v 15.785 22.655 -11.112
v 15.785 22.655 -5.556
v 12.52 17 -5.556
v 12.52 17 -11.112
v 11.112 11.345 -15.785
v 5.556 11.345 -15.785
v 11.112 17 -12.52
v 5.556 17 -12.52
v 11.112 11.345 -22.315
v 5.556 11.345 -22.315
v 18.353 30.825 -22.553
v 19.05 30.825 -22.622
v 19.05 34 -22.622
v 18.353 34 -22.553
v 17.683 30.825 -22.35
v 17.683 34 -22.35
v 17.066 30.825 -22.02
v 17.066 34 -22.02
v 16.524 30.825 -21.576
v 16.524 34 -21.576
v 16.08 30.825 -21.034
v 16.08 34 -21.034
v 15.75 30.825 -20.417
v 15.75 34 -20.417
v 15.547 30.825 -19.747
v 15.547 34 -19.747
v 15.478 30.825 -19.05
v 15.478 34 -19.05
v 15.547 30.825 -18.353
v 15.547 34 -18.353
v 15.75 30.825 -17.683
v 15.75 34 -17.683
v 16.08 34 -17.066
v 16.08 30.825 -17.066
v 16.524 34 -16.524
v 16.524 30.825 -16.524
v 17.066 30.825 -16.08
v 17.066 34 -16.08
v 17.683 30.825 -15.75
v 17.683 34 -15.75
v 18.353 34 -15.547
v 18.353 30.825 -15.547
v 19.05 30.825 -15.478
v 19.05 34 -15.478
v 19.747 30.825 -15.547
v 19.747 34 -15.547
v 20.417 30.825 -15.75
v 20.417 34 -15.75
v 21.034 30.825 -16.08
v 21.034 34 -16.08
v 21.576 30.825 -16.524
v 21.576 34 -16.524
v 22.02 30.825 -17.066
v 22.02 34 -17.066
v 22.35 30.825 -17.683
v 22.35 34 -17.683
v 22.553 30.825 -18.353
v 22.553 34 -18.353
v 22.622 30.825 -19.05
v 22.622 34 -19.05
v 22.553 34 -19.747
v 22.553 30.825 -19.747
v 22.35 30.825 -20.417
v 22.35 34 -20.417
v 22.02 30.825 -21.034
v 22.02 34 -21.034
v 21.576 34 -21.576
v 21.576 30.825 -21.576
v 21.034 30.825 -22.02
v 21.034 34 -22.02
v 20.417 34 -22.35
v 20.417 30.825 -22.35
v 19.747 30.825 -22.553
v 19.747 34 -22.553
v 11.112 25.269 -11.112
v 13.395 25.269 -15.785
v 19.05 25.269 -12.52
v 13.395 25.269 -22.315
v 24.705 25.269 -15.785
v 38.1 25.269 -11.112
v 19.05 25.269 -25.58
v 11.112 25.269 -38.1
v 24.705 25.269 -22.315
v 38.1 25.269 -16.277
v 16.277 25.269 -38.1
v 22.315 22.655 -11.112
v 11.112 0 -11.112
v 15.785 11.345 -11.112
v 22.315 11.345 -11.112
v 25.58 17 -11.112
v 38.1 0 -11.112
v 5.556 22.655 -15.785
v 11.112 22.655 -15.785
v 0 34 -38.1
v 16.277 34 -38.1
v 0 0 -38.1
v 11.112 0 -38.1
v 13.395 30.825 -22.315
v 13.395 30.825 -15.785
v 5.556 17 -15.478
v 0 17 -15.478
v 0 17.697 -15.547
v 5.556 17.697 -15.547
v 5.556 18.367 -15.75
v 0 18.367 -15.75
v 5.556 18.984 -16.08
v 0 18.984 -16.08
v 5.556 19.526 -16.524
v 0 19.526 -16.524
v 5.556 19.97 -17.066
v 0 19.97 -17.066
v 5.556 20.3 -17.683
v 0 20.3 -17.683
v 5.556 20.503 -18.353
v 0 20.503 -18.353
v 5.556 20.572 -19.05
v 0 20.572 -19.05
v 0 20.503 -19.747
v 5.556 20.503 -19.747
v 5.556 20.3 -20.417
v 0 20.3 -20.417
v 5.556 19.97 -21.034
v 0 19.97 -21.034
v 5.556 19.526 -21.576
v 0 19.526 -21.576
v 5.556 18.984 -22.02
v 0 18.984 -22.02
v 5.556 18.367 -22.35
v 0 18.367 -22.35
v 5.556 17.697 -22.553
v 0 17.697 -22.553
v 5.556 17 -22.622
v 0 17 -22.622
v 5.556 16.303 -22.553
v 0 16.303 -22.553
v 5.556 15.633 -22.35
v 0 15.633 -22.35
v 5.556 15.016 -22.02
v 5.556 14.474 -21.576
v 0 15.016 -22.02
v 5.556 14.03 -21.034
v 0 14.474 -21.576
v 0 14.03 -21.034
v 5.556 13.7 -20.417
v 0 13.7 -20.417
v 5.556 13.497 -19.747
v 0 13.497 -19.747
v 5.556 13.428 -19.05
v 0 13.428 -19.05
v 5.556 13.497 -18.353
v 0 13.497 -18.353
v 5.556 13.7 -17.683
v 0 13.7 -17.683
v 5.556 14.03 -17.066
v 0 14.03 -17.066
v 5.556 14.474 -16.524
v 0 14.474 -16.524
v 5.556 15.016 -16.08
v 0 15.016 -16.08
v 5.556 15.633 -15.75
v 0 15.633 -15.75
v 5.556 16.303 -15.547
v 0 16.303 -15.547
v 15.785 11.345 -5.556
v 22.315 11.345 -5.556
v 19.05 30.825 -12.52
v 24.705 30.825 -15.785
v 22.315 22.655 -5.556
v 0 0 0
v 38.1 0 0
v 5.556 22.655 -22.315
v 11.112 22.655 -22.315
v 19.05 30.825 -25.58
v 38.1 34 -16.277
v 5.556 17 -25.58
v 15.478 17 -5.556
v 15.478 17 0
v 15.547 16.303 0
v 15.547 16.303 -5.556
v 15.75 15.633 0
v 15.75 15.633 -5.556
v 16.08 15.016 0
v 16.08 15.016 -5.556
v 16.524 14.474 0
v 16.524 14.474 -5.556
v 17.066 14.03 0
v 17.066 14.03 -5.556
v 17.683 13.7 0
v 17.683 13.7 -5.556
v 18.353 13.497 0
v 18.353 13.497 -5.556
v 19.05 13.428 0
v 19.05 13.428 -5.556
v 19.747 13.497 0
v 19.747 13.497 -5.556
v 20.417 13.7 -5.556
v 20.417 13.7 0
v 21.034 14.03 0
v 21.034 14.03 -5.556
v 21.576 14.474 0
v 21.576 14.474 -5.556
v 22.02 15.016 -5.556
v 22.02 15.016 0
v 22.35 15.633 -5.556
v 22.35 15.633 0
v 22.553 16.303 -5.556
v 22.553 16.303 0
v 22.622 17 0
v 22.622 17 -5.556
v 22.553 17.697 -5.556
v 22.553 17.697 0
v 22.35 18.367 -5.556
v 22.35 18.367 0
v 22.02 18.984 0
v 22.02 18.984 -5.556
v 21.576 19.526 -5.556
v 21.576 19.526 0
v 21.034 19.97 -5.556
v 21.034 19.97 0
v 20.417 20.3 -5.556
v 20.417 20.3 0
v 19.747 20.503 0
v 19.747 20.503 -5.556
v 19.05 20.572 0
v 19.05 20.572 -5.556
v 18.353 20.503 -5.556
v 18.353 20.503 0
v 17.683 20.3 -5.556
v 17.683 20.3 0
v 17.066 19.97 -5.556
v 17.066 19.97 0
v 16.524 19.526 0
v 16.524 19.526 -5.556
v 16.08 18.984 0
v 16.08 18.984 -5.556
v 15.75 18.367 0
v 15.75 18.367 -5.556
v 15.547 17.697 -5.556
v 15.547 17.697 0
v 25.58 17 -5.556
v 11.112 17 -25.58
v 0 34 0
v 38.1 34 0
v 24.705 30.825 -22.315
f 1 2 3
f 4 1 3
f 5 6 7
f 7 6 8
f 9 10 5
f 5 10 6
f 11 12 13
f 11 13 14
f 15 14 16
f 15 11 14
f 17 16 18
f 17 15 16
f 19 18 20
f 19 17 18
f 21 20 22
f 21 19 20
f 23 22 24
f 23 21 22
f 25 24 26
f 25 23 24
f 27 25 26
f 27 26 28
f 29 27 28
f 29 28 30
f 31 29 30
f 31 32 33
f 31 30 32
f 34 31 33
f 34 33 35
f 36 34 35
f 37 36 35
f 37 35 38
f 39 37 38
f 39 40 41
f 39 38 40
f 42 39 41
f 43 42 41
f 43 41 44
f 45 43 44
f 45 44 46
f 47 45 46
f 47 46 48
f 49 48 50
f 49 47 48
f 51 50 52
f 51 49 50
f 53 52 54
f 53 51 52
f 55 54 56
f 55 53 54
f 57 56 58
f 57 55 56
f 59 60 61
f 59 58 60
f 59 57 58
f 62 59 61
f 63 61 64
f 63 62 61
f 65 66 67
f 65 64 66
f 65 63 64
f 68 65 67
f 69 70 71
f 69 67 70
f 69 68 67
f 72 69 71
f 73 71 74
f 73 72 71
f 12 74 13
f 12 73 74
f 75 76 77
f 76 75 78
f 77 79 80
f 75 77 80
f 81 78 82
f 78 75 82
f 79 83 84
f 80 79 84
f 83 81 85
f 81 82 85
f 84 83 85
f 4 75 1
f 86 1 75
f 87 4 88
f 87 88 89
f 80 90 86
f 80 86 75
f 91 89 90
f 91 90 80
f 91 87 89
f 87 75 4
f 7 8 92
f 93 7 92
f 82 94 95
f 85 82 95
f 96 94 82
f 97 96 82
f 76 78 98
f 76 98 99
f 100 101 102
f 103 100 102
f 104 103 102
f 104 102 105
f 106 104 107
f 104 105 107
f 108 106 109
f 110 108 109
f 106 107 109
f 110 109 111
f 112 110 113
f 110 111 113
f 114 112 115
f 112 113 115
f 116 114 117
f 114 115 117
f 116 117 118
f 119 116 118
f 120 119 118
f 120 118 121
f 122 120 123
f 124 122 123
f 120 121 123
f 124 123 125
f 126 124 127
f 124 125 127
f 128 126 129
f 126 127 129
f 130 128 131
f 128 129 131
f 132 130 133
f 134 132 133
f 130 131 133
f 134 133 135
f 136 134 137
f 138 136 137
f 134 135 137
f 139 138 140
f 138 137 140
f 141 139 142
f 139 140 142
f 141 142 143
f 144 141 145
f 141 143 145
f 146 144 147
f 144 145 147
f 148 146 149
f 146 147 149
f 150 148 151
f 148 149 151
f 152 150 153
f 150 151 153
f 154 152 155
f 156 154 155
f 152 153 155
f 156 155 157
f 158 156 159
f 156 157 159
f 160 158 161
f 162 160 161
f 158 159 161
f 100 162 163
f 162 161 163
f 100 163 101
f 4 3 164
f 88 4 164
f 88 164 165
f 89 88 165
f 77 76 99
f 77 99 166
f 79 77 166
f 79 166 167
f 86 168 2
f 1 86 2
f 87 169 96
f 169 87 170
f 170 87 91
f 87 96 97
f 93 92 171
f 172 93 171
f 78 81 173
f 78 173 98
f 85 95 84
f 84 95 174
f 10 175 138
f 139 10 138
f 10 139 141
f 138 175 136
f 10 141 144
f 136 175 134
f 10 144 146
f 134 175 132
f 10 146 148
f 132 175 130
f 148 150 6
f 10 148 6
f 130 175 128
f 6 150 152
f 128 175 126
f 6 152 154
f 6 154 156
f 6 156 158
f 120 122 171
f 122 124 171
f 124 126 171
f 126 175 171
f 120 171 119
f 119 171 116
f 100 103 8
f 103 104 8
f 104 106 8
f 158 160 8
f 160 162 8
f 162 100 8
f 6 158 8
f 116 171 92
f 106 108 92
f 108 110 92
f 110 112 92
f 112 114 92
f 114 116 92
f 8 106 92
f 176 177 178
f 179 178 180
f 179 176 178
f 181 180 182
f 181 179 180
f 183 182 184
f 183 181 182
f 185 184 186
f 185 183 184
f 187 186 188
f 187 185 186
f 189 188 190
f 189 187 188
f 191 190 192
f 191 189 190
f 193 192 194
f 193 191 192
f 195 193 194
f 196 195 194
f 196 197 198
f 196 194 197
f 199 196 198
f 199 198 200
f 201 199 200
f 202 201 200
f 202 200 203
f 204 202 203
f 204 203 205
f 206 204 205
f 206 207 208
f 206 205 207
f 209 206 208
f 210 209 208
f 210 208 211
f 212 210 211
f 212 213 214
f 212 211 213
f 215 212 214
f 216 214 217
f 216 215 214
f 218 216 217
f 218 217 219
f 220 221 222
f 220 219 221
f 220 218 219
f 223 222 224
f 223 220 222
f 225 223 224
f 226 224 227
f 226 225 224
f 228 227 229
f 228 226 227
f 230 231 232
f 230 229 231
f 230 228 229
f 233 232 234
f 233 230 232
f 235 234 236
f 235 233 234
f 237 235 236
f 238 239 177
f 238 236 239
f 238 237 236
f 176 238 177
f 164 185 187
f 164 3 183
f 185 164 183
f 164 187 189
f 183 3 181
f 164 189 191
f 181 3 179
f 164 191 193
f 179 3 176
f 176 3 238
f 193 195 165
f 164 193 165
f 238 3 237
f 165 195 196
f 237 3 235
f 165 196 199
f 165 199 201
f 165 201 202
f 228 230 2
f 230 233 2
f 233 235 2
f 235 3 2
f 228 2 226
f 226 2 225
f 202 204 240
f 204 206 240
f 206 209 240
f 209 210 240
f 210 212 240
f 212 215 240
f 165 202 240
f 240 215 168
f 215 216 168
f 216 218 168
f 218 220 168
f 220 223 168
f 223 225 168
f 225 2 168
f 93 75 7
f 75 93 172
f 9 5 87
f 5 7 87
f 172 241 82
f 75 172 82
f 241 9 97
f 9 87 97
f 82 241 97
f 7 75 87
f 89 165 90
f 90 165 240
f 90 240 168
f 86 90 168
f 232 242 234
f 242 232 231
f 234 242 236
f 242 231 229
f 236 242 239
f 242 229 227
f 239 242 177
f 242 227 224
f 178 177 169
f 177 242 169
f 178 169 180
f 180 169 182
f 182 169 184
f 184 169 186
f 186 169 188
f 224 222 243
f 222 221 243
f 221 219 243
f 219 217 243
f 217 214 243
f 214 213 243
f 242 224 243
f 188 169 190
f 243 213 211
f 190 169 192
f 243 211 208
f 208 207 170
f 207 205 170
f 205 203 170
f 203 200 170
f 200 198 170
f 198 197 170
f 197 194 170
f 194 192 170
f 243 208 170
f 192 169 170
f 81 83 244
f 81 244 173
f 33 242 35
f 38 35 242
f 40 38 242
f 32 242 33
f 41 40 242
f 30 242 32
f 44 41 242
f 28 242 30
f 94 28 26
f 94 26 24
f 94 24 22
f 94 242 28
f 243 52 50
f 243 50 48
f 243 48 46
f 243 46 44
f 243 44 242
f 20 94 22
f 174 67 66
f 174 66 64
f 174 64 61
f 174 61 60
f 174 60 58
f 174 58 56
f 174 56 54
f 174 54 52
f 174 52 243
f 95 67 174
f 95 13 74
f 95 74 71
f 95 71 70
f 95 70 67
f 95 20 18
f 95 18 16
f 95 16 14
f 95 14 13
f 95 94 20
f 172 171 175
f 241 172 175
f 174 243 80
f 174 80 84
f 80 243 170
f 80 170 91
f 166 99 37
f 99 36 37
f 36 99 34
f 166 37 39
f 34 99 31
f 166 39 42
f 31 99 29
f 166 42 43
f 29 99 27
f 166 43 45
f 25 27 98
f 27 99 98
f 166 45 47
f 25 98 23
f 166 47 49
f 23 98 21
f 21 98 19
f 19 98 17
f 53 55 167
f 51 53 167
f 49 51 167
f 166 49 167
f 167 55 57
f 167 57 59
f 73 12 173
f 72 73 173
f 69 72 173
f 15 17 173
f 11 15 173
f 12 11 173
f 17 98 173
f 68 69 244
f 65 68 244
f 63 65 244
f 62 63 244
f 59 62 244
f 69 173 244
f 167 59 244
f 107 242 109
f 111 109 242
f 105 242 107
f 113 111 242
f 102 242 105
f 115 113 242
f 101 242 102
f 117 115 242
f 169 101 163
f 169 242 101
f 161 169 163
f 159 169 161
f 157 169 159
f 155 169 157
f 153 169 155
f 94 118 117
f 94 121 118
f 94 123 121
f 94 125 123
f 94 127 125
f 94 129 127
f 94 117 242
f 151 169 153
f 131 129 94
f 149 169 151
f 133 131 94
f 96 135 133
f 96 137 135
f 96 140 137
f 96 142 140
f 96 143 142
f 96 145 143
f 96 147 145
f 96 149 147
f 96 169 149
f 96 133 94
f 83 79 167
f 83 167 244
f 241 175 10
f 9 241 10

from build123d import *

# Parameters (mm, degrees)
SKETCH1_W                    = 38.1
SKETCH1_H                    = 38.1
MAIN_BODY_DEPTH              = 34
F_9_32_RIGHT_RAIL_DEPTH      = 64.712008287
F_9_32_RIGHT_RAIL_DEPTH_BACK = 5.55625
SKETCH3_R                    = 3.571875
SKETCH4_R                    = 3.571875
F_9_32_LEFT_RAIL_DEPTH       = 5.55625
F_9_32_TOPPER_DEPTH          = 64.712008287
F_9_32_TOPPER_DEPTH_BACK     = 10
SKETCH8_R                    = 3.571875
HEX_START                    = -5.55625
HEX_HOLE_RIGHT_DEPTH         = 32.54375
HEX_HOLE_LEFT_DEPTH          = 32.54375
INNER_START                  = -34
INNER_CAVITY_OUTLINE_W       = 26.9875
INNER_CAVITY_OUTLINE_H       = 26.9875
INNER_CAVITY_DEPTH           = 25.26875
HEX_START_2                  = -17
HEX_HOLE_TOP_DEPTH           = 13.825
TOP_CORNER_REACH             = 65.712


# Read off the part's stored shape, not the designer's step: Inner Cavity
with BuildPart() as part:
    # Sketch1 → Main Body (new body)
    with BuildSketch(Plane(origin=(0, 0, 0), x_dir=(1, 0, 0), z_dir=(0, 1, 0))):
        with Locations((19.05, 19.05)):
            Rectangle(SKETCH1_W, SKETCH1_H)
    extrude(amount=MAIN_BODY_DEPTH)

    # Sketch3 → 9/32 Right Rail (cut, two sides: drawn at the far end of the back side and taken through both)
    with BuildSketch(Plane.XY.offset(-F_9_32_RIGHT_RAIL_DEPTH_BACK)):
        with Locations(Location((19.05, 17, 0), (0, 0, 180))):
            Circle(SKETCH3_R)
    extrude(amount=F_9_32_RIGHT_RAIL_DEPTH + F_9_32_RIGHT_RAIL_DEPTH_BACK, mode=Mode.SUBTRACT)

    # Sketch4 → 9/32 Left Rail (cut)
    with BuildSketch(Plane.ZY):
        with Locations((-19.05, 17)):
            Circle(SKETCH4_R)
    extrude(amount=-F_9_32_LEFT_RAIL_DEPTH, mode=Mode.SUBTRACT)

    # Sketch8 → 9/32 Topper (cut, two sides: drawn at the far end of the back side and taken through both)
    with BuildSketch(Plane(origin=(0, 34, 0), x_dir=(1, 0, 0), z_dir=(0, 1, 0)).offset(-F_9_32_TOPPER_DEPTH_BACK)):
        with Locations(Location((19.05, 19.05, 0), (0, 0, 90))):
            Circle(SKETCH8_R)
    extrude(amount=F_9_32_TOPPER_DEPTH + F_9_32_TOPPER_DEPTH_BACK, mode=Mode.SUBTRACT)

    # Sketch9 → Hex Hole Right (cut)
    with BuildSketch(Plane.ZY.offset(HEX_START)):
        Polygon((-22.315182739, 22.6554624), (-25.580365478, 17), (-22.315182739, 11.3445376), (-15.784817261, 11.3445376), (-12.519634522, 17), (-15.784817261, 22.6554624), align=None)
    extrude(amount=-HEX_HOLE_RIGHT_DEPTH, mode=Mode.SUBTRACT)

    # Sketch10 → Hex Hole Left (cut)
    with BuildSketch(Plane.XY.offset(HEX_START)):
        Polygon((15.784813595, 22.65546875), (12.51962719, 17), (15.784813595, 11.34453125), (22.315186405, 11.34453125), (25.58037281, 17), (22.315186405, 22.65546875), align=None)
    extrude(amount=-HEX_HOLE_LEFT_DEPTH, mode=Mode.SUBTRACT)

    # Inner Cavity outline → Inner Cavity (cut)
    with BuildSketch(Plane(origin=(0, 34, 0), x_dir=(1, 0, 0), z_dir=(0, 1, 0)).offset(INNER_START)):
        with Locations((24.60625, 24.60625)):
            Rectangle(INNER_CAVITY_OUTLINE_W, INNER_CAVITY_OUTLINE_H)
    extrude(amount=INNER_CAVITY_DEPTH, mode=Mode.SUBTRACT)

    # Sketch14 → Hex Hole Top (cut)
    with BuildSketch(Plane(origin=(0, 34, 0), x_dir=(1, 0, 0), z_dir=(0, 1, 0)).offset(HEX_START_2)):
        Polygon((24.70546875, 22.315186405), (19.05, 25.58037281), (13.39453125, 22.315186405), (13.39453125, 15.784813595), (19.05, 12.51962719), (24.70546875, 15.784813595), align=None)
    extrude(amount=HEX_HOLE_TOP_DEPTH, mode=Mode.SUBTRACT)

    # Sketch16 → Top Corner (cut, up to next)
    with BuildSketch(Plane(origin=(0, 34, 0), x_dir=(1, 0, 0), z_dir=(0, 1, 0)), mode=Mode.PRIVATE) as top_corner_sk1:
        Polygon((38.1, 38.1), (16.276714219, 38.1), (38.1, 16.276714219), align=None)
    top_corner_tool1 = extrude(top_corner_sk1.sketch, amount=-TOP_CORNER_REACH, mode=Mode.PRIVATE) & part.part
    add(top_corner_tool1.solids().sort_by_distance((30.825571, 34, -30.825571))[0], mode=Mode.SUBTRACT)


solid = part.part
